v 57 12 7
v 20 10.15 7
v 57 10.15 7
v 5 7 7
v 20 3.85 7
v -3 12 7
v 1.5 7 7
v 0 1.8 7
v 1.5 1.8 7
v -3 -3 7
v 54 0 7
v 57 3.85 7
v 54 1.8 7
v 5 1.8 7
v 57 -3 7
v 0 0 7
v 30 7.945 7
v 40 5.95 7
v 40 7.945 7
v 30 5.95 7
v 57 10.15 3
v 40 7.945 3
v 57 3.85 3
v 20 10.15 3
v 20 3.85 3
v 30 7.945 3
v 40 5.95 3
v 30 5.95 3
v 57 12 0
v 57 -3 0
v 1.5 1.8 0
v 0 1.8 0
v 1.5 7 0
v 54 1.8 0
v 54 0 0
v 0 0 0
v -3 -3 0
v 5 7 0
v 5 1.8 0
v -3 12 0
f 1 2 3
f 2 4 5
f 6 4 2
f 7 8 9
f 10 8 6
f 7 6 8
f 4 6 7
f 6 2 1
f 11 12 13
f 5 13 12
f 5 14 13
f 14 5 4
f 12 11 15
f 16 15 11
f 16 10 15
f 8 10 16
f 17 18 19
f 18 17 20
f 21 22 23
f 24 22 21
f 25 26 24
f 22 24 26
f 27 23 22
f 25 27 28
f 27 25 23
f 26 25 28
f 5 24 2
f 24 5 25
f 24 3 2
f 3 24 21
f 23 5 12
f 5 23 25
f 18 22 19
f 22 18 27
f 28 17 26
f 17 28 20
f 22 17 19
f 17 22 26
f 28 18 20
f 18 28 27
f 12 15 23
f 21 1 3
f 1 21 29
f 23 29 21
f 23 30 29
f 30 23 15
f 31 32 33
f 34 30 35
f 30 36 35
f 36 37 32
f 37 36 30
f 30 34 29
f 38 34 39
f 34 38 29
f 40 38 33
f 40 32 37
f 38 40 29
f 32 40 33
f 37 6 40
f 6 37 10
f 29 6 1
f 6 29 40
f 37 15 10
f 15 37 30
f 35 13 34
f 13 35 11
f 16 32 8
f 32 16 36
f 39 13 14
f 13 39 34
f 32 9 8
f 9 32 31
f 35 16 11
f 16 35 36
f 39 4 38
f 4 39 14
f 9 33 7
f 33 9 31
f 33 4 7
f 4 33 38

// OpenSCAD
 difference() {
  translate([-3, -3, 0]) cube([60,  15, 7]);
 cube([54,1.8, 50]);
 translate([1.5, 0, 0])cube([3.5, 7, 7]);
     
 translate([140, 7, 3])    {
     scale([1, 1.05, 1])difference() {
    translate([-120, -3, 0])cube([240, 6, 4]);
    translate([100,  -1, 0]) cube([10, 2, 10]);
    translate([-110, -1, 0]) cube([10, 1.9, 10]);;
     }
 }
}
 
